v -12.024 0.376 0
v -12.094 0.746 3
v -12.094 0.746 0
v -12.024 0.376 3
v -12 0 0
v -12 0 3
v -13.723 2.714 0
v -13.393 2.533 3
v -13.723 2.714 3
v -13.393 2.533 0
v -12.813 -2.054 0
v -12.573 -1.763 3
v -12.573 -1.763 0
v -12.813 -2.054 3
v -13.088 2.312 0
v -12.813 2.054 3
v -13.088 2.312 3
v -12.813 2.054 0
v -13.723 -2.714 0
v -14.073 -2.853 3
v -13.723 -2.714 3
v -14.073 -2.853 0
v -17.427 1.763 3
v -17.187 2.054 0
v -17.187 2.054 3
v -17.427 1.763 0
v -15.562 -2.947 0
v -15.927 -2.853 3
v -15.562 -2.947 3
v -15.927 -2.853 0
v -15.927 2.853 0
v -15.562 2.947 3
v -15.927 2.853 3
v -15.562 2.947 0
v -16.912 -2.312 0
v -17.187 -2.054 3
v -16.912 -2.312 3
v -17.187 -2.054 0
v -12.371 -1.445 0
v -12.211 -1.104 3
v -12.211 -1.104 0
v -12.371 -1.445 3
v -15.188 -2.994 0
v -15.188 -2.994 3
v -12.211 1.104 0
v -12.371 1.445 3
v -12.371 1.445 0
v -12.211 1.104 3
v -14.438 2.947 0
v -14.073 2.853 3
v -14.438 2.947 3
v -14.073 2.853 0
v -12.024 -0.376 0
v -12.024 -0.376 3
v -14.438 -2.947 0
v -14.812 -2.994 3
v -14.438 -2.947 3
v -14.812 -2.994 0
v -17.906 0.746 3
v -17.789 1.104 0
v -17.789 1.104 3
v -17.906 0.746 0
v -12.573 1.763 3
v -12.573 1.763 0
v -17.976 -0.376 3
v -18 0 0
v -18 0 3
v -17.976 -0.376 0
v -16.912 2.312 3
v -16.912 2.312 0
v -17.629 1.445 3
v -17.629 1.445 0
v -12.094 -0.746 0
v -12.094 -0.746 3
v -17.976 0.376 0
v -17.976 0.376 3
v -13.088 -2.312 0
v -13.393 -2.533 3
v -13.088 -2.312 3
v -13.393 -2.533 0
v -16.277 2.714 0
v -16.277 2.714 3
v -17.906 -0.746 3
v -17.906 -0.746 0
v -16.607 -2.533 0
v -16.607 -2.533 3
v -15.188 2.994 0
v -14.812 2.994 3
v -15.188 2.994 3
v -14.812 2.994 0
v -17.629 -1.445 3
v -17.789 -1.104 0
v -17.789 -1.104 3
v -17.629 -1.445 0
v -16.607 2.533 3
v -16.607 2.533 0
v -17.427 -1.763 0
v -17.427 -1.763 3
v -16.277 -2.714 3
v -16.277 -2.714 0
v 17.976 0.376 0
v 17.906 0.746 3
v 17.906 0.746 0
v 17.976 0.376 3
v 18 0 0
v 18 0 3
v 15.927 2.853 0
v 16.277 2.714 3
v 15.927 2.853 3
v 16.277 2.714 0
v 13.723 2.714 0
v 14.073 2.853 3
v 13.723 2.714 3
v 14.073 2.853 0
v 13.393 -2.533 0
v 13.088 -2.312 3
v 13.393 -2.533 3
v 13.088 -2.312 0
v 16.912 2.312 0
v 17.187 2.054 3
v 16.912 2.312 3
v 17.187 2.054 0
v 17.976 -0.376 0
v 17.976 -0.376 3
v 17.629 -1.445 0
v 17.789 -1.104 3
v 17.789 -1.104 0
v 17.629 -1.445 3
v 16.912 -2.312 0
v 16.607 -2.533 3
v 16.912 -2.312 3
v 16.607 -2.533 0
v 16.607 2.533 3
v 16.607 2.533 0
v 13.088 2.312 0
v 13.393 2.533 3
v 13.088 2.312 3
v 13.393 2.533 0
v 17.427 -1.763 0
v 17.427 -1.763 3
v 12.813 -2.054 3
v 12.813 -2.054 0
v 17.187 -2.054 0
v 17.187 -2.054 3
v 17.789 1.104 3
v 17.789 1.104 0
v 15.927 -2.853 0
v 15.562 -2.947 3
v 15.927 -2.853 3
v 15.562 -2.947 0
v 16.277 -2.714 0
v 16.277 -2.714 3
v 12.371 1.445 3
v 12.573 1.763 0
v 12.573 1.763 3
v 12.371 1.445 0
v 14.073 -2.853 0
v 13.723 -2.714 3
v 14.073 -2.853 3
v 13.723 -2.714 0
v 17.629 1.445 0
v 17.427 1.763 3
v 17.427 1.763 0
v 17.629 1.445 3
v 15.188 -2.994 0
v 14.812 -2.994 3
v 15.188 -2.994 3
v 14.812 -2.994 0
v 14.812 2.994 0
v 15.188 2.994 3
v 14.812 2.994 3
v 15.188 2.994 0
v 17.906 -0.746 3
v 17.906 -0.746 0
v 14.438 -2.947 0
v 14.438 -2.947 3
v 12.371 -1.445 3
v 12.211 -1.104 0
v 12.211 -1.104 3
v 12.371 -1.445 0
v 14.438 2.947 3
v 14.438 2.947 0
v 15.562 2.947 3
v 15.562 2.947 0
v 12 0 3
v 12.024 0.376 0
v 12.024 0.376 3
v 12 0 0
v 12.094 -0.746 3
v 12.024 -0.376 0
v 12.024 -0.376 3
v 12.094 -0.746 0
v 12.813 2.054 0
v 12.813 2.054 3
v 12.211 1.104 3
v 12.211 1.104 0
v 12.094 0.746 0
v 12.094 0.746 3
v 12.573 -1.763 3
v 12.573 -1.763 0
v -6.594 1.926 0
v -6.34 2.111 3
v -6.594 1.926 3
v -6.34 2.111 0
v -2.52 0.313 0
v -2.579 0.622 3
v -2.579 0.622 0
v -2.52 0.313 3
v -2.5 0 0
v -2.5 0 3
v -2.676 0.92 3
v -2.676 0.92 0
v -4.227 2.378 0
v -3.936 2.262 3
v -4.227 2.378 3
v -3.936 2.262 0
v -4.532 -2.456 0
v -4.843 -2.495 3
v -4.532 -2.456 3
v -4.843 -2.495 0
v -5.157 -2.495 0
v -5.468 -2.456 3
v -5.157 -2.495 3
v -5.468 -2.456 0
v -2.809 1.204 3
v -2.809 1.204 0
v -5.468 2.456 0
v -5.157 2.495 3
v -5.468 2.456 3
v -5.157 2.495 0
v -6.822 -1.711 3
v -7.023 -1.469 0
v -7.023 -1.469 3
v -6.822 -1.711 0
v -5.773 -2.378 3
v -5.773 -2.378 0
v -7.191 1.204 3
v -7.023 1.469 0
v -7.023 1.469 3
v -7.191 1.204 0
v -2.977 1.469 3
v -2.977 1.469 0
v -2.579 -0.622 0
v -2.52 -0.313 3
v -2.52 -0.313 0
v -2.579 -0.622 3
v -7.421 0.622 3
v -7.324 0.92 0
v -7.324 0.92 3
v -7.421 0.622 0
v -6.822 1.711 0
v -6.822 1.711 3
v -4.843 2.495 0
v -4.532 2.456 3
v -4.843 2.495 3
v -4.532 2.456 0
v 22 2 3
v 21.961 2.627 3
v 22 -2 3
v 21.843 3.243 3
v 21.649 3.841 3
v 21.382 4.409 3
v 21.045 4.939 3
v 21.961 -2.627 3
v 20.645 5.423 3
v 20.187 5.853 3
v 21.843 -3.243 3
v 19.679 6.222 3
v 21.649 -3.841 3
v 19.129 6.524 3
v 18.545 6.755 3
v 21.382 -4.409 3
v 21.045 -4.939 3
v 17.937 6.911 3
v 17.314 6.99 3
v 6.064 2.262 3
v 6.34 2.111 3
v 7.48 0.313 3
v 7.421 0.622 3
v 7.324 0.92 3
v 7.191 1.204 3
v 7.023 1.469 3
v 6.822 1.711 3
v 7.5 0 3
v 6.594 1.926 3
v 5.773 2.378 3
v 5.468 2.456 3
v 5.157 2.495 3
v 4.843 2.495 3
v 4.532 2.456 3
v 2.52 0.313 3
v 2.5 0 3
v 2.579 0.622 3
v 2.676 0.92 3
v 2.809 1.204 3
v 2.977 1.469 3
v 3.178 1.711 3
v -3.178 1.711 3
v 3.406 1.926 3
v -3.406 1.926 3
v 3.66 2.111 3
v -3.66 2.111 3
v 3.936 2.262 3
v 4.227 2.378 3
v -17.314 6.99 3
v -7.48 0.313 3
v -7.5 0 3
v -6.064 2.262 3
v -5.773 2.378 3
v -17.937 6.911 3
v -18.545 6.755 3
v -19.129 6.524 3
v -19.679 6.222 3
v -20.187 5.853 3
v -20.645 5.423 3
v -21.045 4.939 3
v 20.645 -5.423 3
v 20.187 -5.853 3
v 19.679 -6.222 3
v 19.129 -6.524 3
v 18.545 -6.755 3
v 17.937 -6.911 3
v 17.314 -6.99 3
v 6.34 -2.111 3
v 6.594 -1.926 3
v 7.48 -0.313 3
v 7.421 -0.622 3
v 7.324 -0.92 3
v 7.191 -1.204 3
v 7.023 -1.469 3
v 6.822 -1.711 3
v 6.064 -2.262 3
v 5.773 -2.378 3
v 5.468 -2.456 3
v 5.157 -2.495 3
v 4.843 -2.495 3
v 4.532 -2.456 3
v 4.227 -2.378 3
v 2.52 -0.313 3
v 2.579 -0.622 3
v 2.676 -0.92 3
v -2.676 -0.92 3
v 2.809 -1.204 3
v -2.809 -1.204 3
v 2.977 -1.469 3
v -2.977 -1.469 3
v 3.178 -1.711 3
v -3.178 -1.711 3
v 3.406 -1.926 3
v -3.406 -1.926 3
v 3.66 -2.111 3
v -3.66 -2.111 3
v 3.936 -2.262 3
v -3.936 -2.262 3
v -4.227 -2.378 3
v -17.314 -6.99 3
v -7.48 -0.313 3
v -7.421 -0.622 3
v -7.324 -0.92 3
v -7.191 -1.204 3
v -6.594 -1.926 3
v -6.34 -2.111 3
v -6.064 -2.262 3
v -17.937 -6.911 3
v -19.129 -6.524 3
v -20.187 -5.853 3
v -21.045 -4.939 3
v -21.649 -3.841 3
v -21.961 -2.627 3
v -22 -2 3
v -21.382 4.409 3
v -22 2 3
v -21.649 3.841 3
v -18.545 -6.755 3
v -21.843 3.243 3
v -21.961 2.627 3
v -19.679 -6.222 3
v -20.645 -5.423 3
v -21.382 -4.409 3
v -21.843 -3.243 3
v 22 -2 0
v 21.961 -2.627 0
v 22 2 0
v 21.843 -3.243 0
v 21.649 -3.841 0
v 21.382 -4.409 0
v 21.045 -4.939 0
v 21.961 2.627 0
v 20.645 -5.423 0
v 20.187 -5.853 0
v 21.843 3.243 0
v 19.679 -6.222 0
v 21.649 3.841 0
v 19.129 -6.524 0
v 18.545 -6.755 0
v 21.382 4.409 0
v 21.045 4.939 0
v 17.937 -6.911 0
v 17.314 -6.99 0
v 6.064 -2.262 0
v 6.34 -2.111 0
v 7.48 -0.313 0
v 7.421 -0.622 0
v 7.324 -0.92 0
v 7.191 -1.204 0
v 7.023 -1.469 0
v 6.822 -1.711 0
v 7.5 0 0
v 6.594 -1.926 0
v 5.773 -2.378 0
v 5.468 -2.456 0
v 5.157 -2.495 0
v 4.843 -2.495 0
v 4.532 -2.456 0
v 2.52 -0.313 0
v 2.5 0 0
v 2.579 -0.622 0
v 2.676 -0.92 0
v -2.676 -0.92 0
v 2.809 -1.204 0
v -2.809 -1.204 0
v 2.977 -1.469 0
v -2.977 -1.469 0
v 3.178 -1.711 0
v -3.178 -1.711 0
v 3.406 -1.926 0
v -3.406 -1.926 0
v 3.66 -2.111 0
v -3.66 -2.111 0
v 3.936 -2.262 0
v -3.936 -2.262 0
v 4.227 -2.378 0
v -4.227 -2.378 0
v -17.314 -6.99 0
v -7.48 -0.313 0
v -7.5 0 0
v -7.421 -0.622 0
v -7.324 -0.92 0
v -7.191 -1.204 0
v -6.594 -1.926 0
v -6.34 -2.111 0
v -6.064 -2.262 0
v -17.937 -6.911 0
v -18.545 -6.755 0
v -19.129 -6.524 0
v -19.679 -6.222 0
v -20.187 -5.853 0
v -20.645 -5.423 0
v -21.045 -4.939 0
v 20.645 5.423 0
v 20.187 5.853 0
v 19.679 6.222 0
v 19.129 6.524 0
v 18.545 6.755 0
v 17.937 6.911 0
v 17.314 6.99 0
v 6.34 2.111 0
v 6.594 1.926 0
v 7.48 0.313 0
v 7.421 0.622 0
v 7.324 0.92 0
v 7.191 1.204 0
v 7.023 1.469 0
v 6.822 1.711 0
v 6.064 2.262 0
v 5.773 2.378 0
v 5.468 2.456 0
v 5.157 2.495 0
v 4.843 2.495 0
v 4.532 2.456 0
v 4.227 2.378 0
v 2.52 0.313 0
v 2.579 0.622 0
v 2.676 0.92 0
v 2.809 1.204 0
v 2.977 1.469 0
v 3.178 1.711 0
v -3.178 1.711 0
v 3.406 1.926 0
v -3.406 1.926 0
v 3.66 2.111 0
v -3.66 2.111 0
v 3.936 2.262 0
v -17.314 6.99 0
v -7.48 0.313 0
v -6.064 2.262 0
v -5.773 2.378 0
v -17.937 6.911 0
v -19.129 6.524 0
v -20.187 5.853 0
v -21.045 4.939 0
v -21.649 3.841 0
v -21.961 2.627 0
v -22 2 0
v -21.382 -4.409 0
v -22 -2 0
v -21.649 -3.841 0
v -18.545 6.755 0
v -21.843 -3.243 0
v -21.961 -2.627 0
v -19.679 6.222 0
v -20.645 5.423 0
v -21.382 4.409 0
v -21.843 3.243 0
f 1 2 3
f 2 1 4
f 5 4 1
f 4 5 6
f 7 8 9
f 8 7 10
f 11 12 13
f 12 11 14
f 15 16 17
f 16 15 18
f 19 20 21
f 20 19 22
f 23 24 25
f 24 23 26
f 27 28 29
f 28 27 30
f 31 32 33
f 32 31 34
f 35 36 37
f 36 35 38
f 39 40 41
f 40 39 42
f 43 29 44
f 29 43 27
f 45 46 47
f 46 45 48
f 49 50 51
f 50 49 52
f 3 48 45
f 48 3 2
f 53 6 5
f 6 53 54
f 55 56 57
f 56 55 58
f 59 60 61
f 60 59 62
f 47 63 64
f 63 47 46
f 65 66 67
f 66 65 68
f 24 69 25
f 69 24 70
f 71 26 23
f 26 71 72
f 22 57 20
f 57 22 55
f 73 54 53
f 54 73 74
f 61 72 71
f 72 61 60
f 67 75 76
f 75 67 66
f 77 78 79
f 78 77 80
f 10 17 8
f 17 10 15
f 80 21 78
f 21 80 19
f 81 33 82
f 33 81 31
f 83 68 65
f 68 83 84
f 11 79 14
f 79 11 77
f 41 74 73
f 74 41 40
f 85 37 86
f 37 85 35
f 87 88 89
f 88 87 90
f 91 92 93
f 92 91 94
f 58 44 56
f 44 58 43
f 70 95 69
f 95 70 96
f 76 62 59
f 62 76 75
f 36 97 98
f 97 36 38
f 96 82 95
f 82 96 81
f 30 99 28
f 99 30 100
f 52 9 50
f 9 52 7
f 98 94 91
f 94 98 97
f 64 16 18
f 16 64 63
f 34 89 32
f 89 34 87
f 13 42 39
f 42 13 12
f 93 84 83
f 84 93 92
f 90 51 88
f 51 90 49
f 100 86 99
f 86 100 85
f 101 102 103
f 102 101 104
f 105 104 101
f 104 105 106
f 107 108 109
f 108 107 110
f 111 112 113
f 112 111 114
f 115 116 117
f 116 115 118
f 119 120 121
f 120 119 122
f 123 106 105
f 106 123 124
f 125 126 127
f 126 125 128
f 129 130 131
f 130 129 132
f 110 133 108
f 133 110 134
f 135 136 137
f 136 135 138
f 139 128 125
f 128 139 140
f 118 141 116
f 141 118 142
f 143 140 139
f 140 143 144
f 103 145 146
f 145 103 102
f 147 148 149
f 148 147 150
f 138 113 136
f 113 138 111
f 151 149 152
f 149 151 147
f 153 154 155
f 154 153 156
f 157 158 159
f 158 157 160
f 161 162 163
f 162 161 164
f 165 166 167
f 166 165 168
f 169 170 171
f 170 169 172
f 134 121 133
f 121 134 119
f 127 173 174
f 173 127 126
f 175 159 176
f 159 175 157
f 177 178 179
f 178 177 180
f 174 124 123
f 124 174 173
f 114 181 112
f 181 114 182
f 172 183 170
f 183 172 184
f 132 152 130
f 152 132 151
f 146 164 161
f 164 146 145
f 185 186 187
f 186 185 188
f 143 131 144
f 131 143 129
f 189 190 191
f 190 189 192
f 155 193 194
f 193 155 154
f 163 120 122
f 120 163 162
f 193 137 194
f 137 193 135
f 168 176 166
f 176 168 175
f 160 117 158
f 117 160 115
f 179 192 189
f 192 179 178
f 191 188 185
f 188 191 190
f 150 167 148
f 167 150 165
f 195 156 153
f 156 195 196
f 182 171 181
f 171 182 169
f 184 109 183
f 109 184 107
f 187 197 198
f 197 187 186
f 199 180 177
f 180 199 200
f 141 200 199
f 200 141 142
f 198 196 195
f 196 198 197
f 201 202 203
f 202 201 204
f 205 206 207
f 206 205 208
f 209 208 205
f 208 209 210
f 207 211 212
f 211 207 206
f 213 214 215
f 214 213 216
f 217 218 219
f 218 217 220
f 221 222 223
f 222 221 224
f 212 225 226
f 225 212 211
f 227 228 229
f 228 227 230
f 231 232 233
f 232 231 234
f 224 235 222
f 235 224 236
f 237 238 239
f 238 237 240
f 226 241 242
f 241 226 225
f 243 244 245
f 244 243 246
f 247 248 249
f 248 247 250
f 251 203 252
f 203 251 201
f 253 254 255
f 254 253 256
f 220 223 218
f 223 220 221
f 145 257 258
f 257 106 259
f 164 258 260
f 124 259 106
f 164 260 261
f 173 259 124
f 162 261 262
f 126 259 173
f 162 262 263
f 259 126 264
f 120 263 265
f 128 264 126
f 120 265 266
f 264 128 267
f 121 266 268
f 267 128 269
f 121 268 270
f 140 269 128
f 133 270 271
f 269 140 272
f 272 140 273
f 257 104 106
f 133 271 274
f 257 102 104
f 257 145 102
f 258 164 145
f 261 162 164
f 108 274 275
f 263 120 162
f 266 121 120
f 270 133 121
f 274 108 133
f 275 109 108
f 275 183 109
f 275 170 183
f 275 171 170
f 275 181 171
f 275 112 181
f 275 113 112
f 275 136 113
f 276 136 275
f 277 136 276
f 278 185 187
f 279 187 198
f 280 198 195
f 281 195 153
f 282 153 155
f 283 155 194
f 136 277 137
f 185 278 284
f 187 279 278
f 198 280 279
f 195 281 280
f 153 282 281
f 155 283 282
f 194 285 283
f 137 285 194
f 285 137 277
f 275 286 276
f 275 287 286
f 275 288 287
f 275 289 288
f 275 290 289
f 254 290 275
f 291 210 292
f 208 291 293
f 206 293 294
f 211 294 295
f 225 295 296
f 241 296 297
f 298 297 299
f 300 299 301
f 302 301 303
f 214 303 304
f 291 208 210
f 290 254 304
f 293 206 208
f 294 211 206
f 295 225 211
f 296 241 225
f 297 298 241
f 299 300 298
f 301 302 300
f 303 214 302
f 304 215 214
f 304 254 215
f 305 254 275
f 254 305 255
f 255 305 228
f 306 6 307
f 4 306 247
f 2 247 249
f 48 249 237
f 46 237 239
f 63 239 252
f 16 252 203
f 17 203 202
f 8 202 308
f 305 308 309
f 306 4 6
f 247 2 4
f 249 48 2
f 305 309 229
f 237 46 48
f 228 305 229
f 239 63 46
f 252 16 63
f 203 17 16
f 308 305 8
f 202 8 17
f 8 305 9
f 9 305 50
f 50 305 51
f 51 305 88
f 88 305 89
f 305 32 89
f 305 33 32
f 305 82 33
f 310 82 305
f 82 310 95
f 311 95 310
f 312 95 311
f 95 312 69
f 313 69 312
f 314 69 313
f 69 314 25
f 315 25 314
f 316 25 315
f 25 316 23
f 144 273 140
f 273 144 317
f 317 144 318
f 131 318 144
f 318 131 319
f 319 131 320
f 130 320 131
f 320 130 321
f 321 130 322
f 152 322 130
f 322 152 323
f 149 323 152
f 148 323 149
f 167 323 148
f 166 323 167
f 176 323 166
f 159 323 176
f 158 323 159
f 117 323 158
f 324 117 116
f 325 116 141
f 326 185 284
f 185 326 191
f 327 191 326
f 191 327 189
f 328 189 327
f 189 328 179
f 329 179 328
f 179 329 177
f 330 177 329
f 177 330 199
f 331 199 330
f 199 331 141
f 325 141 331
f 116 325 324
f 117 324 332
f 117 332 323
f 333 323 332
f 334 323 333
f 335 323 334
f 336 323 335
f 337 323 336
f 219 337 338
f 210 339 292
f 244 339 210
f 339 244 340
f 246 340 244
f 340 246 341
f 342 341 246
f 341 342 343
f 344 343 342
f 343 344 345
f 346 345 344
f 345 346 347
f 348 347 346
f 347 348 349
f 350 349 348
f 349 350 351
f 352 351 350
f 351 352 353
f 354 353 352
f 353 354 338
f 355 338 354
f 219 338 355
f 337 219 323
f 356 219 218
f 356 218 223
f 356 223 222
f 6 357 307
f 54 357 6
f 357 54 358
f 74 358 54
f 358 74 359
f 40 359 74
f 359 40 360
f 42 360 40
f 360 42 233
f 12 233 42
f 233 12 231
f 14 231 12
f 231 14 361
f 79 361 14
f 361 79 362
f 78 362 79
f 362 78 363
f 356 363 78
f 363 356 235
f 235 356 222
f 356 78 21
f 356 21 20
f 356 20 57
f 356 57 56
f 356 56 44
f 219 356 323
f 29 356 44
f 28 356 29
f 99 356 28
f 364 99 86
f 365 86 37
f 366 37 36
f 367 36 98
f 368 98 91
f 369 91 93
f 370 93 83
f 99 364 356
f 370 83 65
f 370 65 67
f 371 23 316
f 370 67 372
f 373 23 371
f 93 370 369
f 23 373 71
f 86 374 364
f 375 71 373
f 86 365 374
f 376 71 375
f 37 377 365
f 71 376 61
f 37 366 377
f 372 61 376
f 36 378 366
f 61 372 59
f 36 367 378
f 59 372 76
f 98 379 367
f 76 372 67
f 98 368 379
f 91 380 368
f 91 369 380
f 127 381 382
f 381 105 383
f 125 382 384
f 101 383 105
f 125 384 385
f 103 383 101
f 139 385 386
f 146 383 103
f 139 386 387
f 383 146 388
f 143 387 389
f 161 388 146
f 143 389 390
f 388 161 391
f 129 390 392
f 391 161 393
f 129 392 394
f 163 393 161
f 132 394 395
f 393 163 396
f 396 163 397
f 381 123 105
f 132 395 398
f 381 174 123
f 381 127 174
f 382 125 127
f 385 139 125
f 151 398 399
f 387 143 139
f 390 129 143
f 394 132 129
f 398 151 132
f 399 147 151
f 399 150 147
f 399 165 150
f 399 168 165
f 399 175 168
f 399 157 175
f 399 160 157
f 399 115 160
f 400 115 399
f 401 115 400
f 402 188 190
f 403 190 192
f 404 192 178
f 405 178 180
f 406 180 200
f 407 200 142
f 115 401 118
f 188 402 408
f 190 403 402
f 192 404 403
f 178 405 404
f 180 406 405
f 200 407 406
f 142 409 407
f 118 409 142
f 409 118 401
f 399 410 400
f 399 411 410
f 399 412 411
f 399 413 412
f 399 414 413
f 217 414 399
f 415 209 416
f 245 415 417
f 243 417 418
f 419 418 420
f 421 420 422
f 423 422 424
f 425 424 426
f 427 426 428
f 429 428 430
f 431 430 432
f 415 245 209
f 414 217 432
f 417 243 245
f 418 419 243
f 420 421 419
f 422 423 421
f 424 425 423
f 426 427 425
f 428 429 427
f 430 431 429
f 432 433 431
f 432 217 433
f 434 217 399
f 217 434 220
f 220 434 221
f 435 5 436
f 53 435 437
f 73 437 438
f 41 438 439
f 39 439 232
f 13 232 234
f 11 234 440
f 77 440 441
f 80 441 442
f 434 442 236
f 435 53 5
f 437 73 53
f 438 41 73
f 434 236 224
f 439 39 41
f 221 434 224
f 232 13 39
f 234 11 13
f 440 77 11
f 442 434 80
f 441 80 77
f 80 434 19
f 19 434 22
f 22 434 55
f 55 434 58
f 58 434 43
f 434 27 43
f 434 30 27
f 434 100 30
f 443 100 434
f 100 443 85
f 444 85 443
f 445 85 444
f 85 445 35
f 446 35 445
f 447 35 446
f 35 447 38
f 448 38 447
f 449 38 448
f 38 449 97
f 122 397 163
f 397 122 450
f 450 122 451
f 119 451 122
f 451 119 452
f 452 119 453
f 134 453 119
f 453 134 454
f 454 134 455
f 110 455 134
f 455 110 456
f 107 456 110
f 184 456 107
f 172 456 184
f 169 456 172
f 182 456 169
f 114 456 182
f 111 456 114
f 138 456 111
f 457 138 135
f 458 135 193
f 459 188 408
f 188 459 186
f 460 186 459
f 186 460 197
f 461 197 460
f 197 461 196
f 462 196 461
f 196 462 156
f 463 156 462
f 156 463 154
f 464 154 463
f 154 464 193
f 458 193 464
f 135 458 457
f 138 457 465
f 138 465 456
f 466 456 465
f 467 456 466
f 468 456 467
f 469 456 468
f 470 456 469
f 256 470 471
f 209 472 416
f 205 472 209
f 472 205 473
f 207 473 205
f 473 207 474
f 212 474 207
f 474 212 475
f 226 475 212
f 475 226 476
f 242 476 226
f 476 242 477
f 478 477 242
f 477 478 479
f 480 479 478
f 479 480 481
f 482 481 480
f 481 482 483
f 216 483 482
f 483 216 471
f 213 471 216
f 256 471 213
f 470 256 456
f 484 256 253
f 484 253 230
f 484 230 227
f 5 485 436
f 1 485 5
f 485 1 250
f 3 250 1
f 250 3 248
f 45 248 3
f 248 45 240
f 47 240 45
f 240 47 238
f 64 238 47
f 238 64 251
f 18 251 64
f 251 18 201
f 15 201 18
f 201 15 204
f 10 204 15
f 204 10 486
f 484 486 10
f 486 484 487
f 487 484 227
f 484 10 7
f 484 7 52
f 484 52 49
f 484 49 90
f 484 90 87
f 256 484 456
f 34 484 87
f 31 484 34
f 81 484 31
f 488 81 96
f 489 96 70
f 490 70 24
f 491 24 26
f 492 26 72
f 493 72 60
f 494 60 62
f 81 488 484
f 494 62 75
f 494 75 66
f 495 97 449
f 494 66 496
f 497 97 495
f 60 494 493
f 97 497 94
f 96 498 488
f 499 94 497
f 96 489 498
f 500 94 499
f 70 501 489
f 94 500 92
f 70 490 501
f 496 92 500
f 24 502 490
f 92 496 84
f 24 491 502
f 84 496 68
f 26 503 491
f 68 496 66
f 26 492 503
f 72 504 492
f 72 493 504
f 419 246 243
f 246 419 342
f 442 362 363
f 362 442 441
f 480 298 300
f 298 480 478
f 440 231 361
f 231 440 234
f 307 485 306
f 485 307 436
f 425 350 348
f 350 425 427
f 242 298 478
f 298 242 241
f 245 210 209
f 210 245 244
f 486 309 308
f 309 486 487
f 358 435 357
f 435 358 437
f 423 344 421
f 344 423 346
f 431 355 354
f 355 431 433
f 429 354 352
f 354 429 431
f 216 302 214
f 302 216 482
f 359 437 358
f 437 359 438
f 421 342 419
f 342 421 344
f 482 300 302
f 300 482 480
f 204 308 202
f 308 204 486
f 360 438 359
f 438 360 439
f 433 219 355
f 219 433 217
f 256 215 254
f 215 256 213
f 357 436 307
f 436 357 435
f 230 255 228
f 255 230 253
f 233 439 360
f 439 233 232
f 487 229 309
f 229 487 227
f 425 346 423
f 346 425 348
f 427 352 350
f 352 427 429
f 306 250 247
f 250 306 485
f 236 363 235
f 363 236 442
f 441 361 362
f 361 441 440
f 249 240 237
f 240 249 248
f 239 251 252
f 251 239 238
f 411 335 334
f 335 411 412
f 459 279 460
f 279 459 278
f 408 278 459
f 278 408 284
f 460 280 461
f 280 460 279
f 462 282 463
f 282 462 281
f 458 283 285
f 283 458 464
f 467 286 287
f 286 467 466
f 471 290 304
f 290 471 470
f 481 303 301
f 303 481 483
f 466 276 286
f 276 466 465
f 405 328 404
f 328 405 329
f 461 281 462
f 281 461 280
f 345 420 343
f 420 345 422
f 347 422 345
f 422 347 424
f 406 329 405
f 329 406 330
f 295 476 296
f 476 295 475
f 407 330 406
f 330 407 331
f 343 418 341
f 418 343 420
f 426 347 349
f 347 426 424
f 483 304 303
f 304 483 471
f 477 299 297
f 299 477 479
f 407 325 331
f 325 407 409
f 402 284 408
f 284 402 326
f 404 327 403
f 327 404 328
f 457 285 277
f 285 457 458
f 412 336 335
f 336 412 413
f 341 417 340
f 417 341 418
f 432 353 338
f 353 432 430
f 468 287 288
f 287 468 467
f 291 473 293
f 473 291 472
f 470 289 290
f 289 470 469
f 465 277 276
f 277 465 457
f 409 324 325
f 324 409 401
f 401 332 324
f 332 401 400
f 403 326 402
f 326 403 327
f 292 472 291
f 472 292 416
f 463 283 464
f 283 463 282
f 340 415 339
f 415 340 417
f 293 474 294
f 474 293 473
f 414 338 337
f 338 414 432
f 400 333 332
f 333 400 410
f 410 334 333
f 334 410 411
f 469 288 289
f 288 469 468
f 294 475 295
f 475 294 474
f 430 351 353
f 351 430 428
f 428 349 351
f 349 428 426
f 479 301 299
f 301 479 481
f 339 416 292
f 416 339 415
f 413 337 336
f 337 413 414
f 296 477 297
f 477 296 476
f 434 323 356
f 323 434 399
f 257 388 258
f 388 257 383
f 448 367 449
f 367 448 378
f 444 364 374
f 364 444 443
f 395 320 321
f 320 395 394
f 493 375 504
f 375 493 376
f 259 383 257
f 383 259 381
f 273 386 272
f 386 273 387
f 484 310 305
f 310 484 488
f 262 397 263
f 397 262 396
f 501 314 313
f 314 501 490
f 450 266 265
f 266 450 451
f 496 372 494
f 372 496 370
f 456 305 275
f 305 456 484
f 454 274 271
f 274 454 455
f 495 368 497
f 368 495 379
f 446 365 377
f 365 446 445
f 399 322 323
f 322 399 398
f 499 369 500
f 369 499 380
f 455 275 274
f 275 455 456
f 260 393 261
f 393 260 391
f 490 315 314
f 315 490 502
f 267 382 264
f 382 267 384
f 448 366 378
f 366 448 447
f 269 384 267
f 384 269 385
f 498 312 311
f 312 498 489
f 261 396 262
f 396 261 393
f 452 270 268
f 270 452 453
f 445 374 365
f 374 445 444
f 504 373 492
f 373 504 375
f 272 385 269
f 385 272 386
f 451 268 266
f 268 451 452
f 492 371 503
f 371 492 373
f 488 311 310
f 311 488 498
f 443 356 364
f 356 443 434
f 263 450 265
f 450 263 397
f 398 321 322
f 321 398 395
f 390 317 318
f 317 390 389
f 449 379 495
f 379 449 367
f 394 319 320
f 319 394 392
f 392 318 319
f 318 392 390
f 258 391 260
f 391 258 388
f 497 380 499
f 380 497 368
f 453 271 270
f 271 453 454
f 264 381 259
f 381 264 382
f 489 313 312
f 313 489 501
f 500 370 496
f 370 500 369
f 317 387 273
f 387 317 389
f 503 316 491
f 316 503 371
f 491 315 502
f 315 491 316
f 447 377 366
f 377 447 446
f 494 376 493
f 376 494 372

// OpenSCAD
$fn = 50;


difference() {
	union() {
		hull() {
			translate(v = [-17.0000000000, 2.0000000000, 0]) {
				cylinder(h = 3, r = 5);
			}
			translate(v = [17.0000000000, 2.0000000000, 0]) {
				cylinder(h = 3, r = 5);
			}
			translate(v = [-17.0000000000, -2.0000000000, 0]) {
				cylinder(h = 3, r = 5);
			}
			translate(v = [17.0000000000, -2.0000000000, 0]) {
				cylinder(h = 3, r = 5);
			}
		}
	}
	union() {
		#translate(v = [-15.0000000000, 0.0000000000, 0]) {
			cylinder(h = 3, r = 3.0000000000);
		}
		#translate(v = [15.0000000000, 0.0000000000, 0]) {
			cylinder(h = 3, r = 3.0000000000);
		}
		#translate(v = [-15.0000000000, 0.0000000000, -100.0000000000]) {
			cylinder(h = 200, r = 3.0000000000);
		}
		#translate(v = [-15.0000000000, 0.0000000000, -100.0000000000]) {
			cylinder(h = 200, r = 3.0000000000);
		}
		#translate(v = [15.0000000000, 0.0000000000, -100.0000000000]) {
			cylinder(h = 200, r = 3.0000000000);
		}
		#translate(v = [15.0000000000, 0.0000000000, -100.0000000000]) {
			cylinder(h = 200, r = 3.0000000000);
		}
		#translate(v = [-15.0000000000, 0.0000000000, 0]) {
			cylinder(h = 3, r = 1.5000000000);
		}
		#translate(v = [15.0000000000, 0.0000000000, 0]) {
			cylinder(h = 3, r = 1.5000000000);
		}
		#translate(v = [-15.0000000000, 0.0000000000, 0]) {
			cylinder(h = 3, r = 1.5000000000);
		}
		#translate(v = [15.0000000000, 0.0000000000, 0]) {
			cylinder(h = 3, r = 1.5000000000);
		}
		#translate(v = [-15.0000000000, 0.0000000000, 0]) {
			cylinder(h = 3, r = 1.5000000000);
		}
		#translate(v = [15.0000000000, 0.0000000000, 0]) {
			cylinder(h = 3, r = 1.5000000000);
		}
		#translate(v = [-5.0000000000, 0, 0]) {
			cylinder(h = 3, r = 2.5000000000);
		}
		#translate(v = [5.0000000000, 0, 0]) {
			cylinder(h = 3, r = 2.5000000000);
		}
	}
}
